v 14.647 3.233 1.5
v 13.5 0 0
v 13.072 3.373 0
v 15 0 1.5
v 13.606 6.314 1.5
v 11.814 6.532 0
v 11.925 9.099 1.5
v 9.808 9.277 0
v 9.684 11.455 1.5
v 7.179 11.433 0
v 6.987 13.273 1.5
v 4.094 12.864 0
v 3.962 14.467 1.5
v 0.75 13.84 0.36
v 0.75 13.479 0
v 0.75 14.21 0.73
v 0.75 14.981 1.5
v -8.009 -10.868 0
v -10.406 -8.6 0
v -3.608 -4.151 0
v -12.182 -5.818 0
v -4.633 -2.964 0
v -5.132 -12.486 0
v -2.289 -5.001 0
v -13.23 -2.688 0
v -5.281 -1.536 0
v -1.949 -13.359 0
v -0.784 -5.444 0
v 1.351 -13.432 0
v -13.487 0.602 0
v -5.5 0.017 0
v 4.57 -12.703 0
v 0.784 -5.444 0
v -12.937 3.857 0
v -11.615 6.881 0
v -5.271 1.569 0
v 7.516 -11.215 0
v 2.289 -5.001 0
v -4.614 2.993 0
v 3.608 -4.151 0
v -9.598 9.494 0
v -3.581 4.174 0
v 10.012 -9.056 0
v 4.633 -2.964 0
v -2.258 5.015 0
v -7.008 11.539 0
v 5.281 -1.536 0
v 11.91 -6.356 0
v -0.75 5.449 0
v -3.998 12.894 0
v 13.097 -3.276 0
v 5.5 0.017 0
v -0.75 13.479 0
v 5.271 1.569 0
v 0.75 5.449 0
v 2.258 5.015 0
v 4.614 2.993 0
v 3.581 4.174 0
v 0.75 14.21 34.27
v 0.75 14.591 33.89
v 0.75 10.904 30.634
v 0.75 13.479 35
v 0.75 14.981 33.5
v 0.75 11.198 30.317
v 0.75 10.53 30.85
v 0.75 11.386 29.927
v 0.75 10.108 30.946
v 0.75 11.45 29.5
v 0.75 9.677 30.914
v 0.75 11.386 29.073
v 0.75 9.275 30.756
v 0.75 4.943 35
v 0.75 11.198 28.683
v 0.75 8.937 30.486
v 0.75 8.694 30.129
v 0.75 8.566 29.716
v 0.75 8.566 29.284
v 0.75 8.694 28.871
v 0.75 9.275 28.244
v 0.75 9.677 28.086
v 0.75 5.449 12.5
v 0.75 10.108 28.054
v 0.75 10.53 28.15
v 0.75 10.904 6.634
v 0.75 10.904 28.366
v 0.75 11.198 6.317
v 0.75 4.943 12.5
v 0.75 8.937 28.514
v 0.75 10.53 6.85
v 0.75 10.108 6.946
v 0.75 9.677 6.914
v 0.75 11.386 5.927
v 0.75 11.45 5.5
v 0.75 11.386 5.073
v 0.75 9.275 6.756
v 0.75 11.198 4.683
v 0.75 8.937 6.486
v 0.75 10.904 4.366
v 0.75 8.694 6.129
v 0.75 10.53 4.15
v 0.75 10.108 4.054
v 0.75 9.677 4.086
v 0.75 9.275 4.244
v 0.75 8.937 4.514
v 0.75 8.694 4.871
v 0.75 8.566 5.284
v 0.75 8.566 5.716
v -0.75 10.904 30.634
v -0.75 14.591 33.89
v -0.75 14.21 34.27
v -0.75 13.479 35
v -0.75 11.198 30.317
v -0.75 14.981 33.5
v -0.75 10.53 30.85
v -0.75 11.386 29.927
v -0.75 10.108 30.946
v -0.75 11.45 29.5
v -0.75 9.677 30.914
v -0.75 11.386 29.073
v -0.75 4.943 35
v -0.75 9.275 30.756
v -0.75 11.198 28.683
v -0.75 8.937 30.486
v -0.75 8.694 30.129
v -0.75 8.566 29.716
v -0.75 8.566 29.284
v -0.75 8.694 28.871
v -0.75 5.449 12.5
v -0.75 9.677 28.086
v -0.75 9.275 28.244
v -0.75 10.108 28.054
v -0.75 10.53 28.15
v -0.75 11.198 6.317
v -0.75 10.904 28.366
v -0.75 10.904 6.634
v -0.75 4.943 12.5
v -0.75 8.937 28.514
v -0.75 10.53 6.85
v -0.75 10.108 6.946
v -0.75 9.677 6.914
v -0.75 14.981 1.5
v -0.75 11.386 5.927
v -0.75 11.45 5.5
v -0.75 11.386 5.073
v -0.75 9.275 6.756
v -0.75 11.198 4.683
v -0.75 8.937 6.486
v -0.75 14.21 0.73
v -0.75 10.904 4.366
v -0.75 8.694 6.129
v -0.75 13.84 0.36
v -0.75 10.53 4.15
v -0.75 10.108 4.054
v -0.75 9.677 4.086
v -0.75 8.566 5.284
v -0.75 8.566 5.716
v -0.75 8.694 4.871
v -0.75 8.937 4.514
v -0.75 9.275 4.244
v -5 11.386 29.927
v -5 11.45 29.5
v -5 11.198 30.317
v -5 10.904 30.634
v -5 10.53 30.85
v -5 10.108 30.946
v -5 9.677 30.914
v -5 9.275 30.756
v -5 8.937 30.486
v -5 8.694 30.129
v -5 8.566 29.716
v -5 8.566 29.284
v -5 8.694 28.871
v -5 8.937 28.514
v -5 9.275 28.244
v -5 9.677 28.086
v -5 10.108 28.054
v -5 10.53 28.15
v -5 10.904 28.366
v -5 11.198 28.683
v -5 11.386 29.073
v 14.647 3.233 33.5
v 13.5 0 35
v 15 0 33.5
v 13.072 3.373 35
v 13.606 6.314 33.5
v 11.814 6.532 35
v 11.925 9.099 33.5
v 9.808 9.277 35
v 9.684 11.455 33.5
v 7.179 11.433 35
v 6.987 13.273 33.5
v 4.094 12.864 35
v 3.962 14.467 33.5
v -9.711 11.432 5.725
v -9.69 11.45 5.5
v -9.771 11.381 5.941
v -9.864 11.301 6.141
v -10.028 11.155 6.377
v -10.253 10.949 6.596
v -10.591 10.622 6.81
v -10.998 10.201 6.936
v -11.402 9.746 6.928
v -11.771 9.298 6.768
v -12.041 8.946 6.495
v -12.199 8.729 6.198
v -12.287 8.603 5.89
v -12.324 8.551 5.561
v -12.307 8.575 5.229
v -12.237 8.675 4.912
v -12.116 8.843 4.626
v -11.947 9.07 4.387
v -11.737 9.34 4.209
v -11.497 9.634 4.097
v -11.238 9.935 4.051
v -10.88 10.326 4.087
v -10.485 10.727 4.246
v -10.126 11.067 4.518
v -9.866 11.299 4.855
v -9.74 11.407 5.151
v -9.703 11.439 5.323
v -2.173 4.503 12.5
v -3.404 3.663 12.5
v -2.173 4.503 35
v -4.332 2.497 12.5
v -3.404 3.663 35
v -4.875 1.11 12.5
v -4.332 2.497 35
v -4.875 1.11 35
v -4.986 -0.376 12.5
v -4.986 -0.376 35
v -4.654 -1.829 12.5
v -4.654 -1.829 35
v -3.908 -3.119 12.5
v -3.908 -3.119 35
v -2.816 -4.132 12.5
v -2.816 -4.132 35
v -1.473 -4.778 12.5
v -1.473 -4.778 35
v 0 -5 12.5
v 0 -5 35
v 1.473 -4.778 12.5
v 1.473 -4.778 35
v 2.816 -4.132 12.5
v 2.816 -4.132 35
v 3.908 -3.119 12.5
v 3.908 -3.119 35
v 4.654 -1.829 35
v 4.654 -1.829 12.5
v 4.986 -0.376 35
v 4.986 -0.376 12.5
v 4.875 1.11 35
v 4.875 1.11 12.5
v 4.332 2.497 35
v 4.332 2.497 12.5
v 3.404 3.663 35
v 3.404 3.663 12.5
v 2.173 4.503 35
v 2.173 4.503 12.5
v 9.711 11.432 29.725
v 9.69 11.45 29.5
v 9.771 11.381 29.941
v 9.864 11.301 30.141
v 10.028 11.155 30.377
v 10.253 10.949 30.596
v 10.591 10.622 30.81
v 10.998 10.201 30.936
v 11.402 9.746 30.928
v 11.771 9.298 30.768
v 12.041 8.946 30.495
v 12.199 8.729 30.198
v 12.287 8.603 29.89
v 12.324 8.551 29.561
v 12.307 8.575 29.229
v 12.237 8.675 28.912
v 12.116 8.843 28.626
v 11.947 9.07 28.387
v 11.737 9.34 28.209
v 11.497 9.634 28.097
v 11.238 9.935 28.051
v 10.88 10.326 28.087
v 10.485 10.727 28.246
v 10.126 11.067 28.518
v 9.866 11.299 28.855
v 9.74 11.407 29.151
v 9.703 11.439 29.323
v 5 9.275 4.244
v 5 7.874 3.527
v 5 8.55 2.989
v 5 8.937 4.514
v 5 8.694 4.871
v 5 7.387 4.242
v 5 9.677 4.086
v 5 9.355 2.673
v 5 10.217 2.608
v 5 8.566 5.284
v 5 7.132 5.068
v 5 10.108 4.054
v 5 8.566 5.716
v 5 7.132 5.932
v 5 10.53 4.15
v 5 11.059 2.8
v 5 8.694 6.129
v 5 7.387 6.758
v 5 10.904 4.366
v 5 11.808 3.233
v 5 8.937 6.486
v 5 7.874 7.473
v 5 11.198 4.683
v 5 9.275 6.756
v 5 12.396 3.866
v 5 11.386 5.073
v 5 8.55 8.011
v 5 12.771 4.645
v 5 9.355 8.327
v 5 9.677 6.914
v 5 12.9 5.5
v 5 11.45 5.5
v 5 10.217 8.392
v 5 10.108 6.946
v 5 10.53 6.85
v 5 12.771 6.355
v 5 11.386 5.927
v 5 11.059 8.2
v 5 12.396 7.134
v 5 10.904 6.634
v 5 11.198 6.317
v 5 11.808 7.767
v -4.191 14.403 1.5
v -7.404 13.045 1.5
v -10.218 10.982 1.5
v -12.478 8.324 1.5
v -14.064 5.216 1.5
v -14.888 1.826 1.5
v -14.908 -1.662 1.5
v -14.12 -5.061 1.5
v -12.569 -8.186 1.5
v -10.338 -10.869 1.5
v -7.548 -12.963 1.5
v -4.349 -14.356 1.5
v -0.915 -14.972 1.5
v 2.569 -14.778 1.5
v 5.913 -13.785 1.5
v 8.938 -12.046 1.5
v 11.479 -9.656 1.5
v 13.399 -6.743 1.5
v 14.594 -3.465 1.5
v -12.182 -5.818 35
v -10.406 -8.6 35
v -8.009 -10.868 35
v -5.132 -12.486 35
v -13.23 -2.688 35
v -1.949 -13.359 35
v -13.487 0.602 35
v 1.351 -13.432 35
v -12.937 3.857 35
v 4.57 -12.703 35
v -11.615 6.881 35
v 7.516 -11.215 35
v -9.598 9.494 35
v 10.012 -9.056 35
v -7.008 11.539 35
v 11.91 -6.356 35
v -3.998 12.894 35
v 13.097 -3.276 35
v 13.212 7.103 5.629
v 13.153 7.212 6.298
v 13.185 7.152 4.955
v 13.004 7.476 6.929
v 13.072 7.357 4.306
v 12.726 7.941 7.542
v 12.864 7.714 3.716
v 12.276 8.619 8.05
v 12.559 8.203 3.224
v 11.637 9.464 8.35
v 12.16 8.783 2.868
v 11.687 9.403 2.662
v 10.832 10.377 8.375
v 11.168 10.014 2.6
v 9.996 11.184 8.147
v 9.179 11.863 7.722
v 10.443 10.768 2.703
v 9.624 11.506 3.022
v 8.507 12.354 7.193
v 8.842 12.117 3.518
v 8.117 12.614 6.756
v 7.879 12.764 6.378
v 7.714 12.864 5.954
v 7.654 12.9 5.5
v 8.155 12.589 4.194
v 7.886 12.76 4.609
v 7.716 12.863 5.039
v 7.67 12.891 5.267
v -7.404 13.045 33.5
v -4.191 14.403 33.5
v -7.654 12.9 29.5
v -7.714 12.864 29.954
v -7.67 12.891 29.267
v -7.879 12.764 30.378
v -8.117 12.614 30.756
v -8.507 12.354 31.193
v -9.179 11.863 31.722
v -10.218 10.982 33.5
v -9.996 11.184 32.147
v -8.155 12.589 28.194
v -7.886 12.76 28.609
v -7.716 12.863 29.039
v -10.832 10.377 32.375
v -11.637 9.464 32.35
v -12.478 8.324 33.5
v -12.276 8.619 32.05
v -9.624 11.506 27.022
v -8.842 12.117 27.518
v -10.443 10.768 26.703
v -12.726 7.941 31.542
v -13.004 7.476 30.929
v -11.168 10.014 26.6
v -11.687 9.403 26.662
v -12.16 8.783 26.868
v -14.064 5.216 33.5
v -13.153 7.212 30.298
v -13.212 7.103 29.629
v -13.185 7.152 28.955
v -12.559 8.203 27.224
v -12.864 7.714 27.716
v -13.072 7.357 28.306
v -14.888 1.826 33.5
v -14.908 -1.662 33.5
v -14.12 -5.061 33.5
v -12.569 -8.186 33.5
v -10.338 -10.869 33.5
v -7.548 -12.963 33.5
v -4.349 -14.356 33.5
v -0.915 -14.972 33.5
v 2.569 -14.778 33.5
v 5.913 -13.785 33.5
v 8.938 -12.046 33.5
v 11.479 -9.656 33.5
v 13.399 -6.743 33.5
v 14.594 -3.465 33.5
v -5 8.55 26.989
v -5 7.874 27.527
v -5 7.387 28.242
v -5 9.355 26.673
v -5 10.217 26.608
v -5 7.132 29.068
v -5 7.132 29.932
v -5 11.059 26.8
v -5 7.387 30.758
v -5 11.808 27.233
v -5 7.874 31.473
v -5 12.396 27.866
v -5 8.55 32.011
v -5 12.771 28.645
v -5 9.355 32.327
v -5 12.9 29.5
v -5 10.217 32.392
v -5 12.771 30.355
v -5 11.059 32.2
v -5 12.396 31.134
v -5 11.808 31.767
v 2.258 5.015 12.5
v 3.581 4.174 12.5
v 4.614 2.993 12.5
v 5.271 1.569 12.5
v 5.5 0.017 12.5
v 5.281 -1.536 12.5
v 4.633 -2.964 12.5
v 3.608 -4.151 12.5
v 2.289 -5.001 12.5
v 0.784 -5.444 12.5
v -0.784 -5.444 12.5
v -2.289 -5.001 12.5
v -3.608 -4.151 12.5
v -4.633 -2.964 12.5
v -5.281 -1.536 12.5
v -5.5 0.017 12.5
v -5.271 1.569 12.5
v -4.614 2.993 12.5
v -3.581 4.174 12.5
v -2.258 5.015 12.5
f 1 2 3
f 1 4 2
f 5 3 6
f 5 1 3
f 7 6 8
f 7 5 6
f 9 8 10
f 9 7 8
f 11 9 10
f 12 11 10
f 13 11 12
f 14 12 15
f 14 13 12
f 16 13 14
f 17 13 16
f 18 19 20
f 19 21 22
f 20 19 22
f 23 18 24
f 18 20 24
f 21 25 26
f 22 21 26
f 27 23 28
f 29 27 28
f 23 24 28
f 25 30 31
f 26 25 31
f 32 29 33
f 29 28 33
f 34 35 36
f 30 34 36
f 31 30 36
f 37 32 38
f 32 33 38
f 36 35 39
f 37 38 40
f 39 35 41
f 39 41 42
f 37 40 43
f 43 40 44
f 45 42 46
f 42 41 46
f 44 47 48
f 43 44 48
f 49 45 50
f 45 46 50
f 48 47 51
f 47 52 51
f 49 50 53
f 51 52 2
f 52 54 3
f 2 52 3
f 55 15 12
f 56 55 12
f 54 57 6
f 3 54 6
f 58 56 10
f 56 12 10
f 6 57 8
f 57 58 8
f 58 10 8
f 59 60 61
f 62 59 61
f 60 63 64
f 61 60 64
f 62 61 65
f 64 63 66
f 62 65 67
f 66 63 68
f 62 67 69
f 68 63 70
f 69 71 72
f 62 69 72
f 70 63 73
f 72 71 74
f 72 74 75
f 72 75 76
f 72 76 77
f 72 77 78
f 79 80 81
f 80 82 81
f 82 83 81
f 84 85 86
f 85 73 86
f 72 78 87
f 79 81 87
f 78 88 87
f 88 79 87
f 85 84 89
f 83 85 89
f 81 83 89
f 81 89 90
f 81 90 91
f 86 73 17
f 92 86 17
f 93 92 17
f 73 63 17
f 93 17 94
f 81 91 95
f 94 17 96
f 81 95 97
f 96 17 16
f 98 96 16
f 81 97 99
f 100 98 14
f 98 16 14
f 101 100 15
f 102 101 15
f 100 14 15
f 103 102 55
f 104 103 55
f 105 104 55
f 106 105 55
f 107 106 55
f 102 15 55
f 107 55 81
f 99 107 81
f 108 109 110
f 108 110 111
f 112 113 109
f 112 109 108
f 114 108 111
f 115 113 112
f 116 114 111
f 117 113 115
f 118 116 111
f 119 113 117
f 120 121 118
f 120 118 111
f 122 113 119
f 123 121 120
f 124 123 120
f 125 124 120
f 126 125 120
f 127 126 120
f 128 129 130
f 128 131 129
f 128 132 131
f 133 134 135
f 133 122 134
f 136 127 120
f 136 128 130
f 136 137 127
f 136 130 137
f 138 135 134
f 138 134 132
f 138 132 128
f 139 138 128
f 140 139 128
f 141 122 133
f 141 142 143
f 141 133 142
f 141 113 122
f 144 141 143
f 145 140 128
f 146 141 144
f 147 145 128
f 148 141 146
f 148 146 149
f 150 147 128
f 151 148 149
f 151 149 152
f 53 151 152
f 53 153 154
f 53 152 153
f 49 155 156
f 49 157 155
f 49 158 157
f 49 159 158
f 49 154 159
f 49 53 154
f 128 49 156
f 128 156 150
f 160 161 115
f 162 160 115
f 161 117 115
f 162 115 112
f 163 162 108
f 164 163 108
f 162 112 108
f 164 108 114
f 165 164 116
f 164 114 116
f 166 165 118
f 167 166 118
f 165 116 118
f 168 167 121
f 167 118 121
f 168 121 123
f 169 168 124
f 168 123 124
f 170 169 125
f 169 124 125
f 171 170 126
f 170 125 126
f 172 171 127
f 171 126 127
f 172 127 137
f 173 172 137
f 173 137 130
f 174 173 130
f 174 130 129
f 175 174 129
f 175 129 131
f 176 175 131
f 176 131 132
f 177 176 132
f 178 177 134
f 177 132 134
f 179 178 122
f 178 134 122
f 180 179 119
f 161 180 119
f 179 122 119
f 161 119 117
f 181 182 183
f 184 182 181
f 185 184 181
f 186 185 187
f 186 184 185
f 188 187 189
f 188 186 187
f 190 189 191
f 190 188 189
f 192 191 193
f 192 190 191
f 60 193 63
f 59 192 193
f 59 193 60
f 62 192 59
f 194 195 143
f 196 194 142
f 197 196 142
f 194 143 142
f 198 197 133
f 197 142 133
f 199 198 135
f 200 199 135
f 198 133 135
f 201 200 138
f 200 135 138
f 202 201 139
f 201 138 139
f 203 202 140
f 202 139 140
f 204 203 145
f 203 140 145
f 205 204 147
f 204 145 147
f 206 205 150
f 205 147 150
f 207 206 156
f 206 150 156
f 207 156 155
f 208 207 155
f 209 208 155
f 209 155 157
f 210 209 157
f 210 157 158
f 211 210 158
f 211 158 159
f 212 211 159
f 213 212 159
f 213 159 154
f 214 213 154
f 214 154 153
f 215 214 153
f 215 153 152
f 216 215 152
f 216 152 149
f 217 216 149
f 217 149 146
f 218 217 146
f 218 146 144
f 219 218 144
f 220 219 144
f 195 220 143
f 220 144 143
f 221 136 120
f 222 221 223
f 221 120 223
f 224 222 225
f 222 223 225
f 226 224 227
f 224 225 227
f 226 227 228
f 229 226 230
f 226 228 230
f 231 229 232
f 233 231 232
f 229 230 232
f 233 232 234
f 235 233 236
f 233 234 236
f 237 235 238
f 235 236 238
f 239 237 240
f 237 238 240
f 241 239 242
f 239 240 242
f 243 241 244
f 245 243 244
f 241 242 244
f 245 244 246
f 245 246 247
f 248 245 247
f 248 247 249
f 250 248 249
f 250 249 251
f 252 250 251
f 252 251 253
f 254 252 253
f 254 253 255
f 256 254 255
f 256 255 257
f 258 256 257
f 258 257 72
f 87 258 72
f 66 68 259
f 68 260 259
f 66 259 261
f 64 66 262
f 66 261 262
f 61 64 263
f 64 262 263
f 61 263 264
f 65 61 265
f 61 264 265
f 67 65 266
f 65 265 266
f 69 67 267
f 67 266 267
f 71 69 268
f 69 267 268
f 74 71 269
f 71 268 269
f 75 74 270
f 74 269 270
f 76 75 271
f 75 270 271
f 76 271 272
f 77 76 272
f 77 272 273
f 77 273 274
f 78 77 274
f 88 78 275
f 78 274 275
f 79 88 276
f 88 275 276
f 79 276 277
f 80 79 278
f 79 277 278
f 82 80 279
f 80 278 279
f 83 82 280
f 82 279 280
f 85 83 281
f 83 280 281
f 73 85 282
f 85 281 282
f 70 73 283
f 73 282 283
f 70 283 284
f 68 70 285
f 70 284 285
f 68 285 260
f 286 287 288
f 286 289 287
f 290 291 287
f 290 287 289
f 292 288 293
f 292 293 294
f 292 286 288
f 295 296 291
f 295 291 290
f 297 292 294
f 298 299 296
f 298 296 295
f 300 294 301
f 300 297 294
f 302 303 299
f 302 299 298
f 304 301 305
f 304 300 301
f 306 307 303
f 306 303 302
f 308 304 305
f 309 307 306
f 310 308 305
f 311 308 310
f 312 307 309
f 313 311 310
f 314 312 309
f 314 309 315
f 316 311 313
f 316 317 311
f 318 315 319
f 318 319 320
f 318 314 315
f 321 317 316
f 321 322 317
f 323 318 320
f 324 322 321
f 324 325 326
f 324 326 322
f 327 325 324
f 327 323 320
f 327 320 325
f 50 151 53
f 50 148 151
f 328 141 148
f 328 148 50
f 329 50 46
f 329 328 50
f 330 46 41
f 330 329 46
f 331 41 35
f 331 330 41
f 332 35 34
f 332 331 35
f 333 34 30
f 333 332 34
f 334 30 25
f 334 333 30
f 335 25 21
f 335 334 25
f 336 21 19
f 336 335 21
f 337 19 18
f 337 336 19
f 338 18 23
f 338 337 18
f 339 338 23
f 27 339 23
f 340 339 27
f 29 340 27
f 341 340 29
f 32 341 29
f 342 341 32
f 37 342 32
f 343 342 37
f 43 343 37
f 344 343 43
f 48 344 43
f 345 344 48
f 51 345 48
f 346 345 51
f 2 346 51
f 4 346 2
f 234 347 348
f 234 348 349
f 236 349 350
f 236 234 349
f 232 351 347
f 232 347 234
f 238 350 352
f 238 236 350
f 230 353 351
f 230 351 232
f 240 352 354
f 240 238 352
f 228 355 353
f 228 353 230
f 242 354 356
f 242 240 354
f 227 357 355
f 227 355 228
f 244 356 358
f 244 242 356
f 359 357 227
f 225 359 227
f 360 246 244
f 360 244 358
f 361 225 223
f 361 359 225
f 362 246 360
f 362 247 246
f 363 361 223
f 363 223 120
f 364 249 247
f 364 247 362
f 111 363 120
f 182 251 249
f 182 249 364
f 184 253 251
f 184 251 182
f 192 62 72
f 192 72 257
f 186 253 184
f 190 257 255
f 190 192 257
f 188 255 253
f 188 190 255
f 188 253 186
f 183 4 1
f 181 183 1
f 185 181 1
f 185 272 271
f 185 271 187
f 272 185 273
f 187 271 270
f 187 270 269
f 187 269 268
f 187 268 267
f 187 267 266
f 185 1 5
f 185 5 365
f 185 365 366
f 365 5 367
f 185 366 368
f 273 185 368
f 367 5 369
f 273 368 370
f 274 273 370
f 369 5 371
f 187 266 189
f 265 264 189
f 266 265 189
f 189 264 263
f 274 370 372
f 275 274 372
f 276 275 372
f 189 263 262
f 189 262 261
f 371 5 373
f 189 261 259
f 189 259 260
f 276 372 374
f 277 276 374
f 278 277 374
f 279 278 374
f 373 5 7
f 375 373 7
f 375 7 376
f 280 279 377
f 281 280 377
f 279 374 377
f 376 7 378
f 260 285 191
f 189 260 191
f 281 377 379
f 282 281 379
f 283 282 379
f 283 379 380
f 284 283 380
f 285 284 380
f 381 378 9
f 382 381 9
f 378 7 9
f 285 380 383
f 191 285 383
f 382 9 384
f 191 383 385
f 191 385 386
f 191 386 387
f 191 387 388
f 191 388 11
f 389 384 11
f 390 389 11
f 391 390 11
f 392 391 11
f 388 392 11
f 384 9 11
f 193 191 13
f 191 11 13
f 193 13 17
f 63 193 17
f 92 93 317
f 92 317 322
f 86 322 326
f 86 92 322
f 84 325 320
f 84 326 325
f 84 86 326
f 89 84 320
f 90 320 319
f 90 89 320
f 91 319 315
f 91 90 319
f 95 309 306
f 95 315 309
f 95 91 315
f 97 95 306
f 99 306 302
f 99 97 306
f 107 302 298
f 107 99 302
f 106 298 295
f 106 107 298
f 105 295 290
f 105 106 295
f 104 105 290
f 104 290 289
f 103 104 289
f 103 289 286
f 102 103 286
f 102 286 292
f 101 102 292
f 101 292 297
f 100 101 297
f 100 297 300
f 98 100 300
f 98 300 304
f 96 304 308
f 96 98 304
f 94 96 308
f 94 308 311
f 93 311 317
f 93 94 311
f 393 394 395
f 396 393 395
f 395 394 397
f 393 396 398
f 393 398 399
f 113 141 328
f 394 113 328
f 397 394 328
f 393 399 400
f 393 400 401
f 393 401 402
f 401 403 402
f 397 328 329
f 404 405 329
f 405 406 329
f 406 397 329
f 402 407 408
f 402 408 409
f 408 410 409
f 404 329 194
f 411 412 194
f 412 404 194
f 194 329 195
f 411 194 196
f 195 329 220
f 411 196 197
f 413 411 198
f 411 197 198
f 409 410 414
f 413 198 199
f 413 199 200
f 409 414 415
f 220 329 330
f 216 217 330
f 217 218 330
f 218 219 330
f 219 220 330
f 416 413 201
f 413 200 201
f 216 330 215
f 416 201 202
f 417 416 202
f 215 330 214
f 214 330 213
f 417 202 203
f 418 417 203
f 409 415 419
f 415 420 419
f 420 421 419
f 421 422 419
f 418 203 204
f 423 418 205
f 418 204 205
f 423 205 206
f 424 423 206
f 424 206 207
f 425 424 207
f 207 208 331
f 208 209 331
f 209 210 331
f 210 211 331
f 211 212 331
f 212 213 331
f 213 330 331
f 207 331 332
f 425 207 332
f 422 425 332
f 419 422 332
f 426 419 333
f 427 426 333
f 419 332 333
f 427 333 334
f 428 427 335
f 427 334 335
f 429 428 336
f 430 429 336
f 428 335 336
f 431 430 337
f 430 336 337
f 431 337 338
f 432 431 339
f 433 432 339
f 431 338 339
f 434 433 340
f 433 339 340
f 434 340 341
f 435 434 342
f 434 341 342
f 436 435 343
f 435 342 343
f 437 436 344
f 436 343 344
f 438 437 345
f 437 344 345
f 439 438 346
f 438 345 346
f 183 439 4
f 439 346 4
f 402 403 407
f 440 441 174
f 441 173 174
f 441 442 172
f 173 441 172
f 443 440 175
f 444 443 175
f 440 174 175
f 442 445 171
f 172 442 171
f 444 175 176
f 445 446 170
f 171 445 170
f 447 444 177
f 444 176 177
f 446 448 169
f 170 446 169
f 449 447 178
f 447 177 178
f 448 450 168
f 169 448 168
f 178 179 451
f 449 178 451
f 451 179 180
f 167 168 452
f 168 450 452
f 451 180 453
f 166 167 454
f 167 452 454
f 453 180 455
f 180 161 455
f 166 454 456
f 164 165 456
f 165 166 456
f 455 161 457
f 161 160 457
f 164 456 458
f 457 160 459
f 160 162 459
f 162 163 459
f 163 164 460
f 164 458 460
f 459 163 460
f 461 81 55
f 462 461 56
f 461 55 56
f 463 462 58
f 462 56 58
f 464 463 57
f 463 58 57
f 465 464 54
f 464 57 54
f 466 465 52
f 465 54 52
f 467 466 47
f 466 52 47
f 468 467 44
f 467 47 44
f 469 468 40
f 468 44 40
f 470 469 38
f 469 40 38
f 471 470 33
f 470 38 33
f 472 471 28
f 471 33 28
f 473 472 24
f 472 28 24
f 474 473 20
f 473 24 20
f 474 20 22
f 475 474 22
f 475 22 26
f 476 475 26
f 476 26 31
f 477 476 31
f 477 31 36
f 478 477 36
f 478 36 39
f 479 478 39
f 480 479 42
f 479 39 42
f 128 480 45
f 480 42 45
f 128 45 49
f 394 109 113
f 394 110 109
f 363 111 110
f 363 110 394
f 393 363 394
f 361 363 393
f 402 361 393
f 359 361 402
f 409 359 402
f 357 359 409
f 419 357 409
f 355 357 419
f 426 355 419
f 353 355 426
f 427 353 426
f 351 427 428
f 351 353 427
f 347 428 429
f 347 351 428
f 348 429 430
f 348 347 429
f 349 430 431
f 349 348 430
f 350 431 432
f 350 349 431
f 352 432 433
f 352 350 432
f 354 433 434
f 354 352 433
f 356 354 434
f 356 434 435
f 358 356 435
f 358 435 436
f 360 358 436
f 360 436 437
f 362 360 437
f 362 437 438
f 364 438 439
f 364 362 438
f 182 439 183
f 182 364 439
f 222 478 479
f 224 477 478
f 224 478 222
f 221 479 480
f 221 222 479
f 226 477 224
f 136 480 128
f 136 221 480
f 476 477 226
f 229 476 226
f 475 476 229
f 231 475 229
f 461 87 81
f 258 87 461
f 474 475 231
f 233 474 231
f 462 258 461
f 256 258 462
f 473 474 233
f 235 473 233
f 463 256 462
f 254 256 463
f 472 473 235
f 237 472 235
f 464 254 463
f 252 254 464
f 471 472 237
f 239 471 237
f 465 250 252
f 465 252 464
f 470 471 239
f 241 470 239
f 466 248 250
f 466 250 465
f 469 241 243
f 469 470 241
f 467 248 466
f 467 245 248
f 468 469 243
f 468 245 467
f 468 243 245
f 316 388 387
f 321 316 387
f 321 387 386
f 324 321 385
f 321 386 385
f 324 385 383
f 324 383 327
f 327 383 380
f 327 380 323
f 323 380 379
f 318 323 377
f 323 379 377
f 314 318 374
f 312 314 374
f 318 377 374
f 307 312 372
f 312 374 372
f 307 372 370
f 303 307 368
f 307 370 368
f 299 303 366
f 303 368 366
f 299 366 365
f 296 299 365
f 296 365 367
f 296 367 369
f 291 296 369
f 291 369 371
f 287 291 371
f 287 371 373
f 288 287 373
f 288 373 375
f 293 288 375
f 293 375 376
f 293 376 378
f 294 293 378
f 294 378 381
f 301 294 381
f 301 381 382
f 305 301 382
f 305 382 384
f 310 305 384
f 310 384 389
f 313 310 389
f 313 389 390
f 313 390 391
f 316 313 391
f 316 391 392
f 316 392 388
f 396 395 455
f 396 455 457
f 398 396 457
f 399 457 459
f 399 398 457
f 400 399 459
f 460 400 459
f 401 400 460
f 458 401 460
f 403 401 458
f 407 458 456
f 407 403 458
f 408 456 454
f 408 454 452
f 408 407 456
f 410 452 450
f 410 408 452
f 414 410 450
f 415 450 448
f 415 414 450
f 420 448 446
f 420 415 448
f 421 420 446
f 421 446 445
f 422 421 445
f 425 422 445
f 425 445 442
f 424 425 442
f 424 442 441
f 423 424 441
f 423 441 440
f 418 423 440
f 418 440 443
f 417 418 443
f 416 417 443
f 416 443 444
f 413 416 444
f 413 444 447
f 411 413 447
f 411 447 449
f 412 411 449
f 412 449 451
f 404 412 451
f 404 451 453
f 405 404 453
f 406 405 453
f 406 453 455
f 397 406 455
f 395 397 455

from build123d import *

# Parameters (mm, degrees)
F0_R      = 15
F1_DEPTH  = 35
F2_R      = 5
F3_DEPTH  = 35.001
F4_R      = 5.5
F5_DEPTH  = 12.5
F6_W      = 1.5
F6_H      = 20
F7_DEPTH  = 35.001
F8_R      = 1.45
F9_DEPTH  = 12.5
F11_R     = 2.9
F12_DEPTH = 10
F14_R     = 2.9
F15_DEPTH = 10
F16_SIZE  = 1.5


with BuildPart() as f1:
    # F0 (on Top) → F1 (new body)
    with BuildSketch(Plane.XY):
        Circle(F0_R)
    extrude(amount=F1_DEPTH)

    # F2 (on face) → F3 (cut, through all)
    with BuildSketch(Plane.XY.offset(35)):
        Circle(F2_R)
    extrude(amount=-F3_DEPTH, mode=Mode.SUBTRACT)

    # F4 (on face) → F5 (cut)
    with BuildSketch(Plane(origin=(0, 0, 0), x_dir=(1, 0, 0), z_dir=(0, 0, -1))):
        Circle(F4_R)
    extrude(amount=-F5_DEPTH, mode=Mode.SUBTRACT)

    # F6 (on face) → F7 (cut, through all)
    with BuildSketch(Plane(origin=(0, 0, 0), x_dir=(1, 0, 0), z_dir=(0, 0, -1))):
        with Locations((0, -10)):
            Rectangle(F6_W, F6_H)
    extrude(amount=-F7_DEPTH, mode=Mode.SUBTRACT)

    # F8 (on Right) → F9 (cut, symmetric)
    with BuildSketch(Plane.YZ):
        with Locations((10, 5.5)):
            Circle(F8_R)
        with Locations((10, 29.5)):
            Circle(F8_R)
    extrude(amount=F9_DEPTH, both=True, mode=Mode.SUBTRACT)

    # F11 (on offset) → F12 (cut)
    with BuildSketch(Plane.YZ.offset(15)):
        with Locations((10, 5.5)):
            Circle(F11_R)
    extrude(amount=-F12_DEPTH, mode=Mode.SUBTRACT)

    # F14 (on offset) → F15 (cut)
    with BuildSketch(Plane.YZ.offset(-15)):
        with Locations((10, 29.5)):
            Circle(F14_R)
    extrude(amount=F15_DEPTH, mode=Mode.SUBTRACT)

    # F16
    f16_edges = [f1.edges().sort_by_distance(p)[0] for p in [
        (-10.338037, -10.868533, 0),
        (-10.338037, -10.868533, 35),
    ]]
    chamfer(f16_edges, length=F16_SIZE)


solid = f1.part
